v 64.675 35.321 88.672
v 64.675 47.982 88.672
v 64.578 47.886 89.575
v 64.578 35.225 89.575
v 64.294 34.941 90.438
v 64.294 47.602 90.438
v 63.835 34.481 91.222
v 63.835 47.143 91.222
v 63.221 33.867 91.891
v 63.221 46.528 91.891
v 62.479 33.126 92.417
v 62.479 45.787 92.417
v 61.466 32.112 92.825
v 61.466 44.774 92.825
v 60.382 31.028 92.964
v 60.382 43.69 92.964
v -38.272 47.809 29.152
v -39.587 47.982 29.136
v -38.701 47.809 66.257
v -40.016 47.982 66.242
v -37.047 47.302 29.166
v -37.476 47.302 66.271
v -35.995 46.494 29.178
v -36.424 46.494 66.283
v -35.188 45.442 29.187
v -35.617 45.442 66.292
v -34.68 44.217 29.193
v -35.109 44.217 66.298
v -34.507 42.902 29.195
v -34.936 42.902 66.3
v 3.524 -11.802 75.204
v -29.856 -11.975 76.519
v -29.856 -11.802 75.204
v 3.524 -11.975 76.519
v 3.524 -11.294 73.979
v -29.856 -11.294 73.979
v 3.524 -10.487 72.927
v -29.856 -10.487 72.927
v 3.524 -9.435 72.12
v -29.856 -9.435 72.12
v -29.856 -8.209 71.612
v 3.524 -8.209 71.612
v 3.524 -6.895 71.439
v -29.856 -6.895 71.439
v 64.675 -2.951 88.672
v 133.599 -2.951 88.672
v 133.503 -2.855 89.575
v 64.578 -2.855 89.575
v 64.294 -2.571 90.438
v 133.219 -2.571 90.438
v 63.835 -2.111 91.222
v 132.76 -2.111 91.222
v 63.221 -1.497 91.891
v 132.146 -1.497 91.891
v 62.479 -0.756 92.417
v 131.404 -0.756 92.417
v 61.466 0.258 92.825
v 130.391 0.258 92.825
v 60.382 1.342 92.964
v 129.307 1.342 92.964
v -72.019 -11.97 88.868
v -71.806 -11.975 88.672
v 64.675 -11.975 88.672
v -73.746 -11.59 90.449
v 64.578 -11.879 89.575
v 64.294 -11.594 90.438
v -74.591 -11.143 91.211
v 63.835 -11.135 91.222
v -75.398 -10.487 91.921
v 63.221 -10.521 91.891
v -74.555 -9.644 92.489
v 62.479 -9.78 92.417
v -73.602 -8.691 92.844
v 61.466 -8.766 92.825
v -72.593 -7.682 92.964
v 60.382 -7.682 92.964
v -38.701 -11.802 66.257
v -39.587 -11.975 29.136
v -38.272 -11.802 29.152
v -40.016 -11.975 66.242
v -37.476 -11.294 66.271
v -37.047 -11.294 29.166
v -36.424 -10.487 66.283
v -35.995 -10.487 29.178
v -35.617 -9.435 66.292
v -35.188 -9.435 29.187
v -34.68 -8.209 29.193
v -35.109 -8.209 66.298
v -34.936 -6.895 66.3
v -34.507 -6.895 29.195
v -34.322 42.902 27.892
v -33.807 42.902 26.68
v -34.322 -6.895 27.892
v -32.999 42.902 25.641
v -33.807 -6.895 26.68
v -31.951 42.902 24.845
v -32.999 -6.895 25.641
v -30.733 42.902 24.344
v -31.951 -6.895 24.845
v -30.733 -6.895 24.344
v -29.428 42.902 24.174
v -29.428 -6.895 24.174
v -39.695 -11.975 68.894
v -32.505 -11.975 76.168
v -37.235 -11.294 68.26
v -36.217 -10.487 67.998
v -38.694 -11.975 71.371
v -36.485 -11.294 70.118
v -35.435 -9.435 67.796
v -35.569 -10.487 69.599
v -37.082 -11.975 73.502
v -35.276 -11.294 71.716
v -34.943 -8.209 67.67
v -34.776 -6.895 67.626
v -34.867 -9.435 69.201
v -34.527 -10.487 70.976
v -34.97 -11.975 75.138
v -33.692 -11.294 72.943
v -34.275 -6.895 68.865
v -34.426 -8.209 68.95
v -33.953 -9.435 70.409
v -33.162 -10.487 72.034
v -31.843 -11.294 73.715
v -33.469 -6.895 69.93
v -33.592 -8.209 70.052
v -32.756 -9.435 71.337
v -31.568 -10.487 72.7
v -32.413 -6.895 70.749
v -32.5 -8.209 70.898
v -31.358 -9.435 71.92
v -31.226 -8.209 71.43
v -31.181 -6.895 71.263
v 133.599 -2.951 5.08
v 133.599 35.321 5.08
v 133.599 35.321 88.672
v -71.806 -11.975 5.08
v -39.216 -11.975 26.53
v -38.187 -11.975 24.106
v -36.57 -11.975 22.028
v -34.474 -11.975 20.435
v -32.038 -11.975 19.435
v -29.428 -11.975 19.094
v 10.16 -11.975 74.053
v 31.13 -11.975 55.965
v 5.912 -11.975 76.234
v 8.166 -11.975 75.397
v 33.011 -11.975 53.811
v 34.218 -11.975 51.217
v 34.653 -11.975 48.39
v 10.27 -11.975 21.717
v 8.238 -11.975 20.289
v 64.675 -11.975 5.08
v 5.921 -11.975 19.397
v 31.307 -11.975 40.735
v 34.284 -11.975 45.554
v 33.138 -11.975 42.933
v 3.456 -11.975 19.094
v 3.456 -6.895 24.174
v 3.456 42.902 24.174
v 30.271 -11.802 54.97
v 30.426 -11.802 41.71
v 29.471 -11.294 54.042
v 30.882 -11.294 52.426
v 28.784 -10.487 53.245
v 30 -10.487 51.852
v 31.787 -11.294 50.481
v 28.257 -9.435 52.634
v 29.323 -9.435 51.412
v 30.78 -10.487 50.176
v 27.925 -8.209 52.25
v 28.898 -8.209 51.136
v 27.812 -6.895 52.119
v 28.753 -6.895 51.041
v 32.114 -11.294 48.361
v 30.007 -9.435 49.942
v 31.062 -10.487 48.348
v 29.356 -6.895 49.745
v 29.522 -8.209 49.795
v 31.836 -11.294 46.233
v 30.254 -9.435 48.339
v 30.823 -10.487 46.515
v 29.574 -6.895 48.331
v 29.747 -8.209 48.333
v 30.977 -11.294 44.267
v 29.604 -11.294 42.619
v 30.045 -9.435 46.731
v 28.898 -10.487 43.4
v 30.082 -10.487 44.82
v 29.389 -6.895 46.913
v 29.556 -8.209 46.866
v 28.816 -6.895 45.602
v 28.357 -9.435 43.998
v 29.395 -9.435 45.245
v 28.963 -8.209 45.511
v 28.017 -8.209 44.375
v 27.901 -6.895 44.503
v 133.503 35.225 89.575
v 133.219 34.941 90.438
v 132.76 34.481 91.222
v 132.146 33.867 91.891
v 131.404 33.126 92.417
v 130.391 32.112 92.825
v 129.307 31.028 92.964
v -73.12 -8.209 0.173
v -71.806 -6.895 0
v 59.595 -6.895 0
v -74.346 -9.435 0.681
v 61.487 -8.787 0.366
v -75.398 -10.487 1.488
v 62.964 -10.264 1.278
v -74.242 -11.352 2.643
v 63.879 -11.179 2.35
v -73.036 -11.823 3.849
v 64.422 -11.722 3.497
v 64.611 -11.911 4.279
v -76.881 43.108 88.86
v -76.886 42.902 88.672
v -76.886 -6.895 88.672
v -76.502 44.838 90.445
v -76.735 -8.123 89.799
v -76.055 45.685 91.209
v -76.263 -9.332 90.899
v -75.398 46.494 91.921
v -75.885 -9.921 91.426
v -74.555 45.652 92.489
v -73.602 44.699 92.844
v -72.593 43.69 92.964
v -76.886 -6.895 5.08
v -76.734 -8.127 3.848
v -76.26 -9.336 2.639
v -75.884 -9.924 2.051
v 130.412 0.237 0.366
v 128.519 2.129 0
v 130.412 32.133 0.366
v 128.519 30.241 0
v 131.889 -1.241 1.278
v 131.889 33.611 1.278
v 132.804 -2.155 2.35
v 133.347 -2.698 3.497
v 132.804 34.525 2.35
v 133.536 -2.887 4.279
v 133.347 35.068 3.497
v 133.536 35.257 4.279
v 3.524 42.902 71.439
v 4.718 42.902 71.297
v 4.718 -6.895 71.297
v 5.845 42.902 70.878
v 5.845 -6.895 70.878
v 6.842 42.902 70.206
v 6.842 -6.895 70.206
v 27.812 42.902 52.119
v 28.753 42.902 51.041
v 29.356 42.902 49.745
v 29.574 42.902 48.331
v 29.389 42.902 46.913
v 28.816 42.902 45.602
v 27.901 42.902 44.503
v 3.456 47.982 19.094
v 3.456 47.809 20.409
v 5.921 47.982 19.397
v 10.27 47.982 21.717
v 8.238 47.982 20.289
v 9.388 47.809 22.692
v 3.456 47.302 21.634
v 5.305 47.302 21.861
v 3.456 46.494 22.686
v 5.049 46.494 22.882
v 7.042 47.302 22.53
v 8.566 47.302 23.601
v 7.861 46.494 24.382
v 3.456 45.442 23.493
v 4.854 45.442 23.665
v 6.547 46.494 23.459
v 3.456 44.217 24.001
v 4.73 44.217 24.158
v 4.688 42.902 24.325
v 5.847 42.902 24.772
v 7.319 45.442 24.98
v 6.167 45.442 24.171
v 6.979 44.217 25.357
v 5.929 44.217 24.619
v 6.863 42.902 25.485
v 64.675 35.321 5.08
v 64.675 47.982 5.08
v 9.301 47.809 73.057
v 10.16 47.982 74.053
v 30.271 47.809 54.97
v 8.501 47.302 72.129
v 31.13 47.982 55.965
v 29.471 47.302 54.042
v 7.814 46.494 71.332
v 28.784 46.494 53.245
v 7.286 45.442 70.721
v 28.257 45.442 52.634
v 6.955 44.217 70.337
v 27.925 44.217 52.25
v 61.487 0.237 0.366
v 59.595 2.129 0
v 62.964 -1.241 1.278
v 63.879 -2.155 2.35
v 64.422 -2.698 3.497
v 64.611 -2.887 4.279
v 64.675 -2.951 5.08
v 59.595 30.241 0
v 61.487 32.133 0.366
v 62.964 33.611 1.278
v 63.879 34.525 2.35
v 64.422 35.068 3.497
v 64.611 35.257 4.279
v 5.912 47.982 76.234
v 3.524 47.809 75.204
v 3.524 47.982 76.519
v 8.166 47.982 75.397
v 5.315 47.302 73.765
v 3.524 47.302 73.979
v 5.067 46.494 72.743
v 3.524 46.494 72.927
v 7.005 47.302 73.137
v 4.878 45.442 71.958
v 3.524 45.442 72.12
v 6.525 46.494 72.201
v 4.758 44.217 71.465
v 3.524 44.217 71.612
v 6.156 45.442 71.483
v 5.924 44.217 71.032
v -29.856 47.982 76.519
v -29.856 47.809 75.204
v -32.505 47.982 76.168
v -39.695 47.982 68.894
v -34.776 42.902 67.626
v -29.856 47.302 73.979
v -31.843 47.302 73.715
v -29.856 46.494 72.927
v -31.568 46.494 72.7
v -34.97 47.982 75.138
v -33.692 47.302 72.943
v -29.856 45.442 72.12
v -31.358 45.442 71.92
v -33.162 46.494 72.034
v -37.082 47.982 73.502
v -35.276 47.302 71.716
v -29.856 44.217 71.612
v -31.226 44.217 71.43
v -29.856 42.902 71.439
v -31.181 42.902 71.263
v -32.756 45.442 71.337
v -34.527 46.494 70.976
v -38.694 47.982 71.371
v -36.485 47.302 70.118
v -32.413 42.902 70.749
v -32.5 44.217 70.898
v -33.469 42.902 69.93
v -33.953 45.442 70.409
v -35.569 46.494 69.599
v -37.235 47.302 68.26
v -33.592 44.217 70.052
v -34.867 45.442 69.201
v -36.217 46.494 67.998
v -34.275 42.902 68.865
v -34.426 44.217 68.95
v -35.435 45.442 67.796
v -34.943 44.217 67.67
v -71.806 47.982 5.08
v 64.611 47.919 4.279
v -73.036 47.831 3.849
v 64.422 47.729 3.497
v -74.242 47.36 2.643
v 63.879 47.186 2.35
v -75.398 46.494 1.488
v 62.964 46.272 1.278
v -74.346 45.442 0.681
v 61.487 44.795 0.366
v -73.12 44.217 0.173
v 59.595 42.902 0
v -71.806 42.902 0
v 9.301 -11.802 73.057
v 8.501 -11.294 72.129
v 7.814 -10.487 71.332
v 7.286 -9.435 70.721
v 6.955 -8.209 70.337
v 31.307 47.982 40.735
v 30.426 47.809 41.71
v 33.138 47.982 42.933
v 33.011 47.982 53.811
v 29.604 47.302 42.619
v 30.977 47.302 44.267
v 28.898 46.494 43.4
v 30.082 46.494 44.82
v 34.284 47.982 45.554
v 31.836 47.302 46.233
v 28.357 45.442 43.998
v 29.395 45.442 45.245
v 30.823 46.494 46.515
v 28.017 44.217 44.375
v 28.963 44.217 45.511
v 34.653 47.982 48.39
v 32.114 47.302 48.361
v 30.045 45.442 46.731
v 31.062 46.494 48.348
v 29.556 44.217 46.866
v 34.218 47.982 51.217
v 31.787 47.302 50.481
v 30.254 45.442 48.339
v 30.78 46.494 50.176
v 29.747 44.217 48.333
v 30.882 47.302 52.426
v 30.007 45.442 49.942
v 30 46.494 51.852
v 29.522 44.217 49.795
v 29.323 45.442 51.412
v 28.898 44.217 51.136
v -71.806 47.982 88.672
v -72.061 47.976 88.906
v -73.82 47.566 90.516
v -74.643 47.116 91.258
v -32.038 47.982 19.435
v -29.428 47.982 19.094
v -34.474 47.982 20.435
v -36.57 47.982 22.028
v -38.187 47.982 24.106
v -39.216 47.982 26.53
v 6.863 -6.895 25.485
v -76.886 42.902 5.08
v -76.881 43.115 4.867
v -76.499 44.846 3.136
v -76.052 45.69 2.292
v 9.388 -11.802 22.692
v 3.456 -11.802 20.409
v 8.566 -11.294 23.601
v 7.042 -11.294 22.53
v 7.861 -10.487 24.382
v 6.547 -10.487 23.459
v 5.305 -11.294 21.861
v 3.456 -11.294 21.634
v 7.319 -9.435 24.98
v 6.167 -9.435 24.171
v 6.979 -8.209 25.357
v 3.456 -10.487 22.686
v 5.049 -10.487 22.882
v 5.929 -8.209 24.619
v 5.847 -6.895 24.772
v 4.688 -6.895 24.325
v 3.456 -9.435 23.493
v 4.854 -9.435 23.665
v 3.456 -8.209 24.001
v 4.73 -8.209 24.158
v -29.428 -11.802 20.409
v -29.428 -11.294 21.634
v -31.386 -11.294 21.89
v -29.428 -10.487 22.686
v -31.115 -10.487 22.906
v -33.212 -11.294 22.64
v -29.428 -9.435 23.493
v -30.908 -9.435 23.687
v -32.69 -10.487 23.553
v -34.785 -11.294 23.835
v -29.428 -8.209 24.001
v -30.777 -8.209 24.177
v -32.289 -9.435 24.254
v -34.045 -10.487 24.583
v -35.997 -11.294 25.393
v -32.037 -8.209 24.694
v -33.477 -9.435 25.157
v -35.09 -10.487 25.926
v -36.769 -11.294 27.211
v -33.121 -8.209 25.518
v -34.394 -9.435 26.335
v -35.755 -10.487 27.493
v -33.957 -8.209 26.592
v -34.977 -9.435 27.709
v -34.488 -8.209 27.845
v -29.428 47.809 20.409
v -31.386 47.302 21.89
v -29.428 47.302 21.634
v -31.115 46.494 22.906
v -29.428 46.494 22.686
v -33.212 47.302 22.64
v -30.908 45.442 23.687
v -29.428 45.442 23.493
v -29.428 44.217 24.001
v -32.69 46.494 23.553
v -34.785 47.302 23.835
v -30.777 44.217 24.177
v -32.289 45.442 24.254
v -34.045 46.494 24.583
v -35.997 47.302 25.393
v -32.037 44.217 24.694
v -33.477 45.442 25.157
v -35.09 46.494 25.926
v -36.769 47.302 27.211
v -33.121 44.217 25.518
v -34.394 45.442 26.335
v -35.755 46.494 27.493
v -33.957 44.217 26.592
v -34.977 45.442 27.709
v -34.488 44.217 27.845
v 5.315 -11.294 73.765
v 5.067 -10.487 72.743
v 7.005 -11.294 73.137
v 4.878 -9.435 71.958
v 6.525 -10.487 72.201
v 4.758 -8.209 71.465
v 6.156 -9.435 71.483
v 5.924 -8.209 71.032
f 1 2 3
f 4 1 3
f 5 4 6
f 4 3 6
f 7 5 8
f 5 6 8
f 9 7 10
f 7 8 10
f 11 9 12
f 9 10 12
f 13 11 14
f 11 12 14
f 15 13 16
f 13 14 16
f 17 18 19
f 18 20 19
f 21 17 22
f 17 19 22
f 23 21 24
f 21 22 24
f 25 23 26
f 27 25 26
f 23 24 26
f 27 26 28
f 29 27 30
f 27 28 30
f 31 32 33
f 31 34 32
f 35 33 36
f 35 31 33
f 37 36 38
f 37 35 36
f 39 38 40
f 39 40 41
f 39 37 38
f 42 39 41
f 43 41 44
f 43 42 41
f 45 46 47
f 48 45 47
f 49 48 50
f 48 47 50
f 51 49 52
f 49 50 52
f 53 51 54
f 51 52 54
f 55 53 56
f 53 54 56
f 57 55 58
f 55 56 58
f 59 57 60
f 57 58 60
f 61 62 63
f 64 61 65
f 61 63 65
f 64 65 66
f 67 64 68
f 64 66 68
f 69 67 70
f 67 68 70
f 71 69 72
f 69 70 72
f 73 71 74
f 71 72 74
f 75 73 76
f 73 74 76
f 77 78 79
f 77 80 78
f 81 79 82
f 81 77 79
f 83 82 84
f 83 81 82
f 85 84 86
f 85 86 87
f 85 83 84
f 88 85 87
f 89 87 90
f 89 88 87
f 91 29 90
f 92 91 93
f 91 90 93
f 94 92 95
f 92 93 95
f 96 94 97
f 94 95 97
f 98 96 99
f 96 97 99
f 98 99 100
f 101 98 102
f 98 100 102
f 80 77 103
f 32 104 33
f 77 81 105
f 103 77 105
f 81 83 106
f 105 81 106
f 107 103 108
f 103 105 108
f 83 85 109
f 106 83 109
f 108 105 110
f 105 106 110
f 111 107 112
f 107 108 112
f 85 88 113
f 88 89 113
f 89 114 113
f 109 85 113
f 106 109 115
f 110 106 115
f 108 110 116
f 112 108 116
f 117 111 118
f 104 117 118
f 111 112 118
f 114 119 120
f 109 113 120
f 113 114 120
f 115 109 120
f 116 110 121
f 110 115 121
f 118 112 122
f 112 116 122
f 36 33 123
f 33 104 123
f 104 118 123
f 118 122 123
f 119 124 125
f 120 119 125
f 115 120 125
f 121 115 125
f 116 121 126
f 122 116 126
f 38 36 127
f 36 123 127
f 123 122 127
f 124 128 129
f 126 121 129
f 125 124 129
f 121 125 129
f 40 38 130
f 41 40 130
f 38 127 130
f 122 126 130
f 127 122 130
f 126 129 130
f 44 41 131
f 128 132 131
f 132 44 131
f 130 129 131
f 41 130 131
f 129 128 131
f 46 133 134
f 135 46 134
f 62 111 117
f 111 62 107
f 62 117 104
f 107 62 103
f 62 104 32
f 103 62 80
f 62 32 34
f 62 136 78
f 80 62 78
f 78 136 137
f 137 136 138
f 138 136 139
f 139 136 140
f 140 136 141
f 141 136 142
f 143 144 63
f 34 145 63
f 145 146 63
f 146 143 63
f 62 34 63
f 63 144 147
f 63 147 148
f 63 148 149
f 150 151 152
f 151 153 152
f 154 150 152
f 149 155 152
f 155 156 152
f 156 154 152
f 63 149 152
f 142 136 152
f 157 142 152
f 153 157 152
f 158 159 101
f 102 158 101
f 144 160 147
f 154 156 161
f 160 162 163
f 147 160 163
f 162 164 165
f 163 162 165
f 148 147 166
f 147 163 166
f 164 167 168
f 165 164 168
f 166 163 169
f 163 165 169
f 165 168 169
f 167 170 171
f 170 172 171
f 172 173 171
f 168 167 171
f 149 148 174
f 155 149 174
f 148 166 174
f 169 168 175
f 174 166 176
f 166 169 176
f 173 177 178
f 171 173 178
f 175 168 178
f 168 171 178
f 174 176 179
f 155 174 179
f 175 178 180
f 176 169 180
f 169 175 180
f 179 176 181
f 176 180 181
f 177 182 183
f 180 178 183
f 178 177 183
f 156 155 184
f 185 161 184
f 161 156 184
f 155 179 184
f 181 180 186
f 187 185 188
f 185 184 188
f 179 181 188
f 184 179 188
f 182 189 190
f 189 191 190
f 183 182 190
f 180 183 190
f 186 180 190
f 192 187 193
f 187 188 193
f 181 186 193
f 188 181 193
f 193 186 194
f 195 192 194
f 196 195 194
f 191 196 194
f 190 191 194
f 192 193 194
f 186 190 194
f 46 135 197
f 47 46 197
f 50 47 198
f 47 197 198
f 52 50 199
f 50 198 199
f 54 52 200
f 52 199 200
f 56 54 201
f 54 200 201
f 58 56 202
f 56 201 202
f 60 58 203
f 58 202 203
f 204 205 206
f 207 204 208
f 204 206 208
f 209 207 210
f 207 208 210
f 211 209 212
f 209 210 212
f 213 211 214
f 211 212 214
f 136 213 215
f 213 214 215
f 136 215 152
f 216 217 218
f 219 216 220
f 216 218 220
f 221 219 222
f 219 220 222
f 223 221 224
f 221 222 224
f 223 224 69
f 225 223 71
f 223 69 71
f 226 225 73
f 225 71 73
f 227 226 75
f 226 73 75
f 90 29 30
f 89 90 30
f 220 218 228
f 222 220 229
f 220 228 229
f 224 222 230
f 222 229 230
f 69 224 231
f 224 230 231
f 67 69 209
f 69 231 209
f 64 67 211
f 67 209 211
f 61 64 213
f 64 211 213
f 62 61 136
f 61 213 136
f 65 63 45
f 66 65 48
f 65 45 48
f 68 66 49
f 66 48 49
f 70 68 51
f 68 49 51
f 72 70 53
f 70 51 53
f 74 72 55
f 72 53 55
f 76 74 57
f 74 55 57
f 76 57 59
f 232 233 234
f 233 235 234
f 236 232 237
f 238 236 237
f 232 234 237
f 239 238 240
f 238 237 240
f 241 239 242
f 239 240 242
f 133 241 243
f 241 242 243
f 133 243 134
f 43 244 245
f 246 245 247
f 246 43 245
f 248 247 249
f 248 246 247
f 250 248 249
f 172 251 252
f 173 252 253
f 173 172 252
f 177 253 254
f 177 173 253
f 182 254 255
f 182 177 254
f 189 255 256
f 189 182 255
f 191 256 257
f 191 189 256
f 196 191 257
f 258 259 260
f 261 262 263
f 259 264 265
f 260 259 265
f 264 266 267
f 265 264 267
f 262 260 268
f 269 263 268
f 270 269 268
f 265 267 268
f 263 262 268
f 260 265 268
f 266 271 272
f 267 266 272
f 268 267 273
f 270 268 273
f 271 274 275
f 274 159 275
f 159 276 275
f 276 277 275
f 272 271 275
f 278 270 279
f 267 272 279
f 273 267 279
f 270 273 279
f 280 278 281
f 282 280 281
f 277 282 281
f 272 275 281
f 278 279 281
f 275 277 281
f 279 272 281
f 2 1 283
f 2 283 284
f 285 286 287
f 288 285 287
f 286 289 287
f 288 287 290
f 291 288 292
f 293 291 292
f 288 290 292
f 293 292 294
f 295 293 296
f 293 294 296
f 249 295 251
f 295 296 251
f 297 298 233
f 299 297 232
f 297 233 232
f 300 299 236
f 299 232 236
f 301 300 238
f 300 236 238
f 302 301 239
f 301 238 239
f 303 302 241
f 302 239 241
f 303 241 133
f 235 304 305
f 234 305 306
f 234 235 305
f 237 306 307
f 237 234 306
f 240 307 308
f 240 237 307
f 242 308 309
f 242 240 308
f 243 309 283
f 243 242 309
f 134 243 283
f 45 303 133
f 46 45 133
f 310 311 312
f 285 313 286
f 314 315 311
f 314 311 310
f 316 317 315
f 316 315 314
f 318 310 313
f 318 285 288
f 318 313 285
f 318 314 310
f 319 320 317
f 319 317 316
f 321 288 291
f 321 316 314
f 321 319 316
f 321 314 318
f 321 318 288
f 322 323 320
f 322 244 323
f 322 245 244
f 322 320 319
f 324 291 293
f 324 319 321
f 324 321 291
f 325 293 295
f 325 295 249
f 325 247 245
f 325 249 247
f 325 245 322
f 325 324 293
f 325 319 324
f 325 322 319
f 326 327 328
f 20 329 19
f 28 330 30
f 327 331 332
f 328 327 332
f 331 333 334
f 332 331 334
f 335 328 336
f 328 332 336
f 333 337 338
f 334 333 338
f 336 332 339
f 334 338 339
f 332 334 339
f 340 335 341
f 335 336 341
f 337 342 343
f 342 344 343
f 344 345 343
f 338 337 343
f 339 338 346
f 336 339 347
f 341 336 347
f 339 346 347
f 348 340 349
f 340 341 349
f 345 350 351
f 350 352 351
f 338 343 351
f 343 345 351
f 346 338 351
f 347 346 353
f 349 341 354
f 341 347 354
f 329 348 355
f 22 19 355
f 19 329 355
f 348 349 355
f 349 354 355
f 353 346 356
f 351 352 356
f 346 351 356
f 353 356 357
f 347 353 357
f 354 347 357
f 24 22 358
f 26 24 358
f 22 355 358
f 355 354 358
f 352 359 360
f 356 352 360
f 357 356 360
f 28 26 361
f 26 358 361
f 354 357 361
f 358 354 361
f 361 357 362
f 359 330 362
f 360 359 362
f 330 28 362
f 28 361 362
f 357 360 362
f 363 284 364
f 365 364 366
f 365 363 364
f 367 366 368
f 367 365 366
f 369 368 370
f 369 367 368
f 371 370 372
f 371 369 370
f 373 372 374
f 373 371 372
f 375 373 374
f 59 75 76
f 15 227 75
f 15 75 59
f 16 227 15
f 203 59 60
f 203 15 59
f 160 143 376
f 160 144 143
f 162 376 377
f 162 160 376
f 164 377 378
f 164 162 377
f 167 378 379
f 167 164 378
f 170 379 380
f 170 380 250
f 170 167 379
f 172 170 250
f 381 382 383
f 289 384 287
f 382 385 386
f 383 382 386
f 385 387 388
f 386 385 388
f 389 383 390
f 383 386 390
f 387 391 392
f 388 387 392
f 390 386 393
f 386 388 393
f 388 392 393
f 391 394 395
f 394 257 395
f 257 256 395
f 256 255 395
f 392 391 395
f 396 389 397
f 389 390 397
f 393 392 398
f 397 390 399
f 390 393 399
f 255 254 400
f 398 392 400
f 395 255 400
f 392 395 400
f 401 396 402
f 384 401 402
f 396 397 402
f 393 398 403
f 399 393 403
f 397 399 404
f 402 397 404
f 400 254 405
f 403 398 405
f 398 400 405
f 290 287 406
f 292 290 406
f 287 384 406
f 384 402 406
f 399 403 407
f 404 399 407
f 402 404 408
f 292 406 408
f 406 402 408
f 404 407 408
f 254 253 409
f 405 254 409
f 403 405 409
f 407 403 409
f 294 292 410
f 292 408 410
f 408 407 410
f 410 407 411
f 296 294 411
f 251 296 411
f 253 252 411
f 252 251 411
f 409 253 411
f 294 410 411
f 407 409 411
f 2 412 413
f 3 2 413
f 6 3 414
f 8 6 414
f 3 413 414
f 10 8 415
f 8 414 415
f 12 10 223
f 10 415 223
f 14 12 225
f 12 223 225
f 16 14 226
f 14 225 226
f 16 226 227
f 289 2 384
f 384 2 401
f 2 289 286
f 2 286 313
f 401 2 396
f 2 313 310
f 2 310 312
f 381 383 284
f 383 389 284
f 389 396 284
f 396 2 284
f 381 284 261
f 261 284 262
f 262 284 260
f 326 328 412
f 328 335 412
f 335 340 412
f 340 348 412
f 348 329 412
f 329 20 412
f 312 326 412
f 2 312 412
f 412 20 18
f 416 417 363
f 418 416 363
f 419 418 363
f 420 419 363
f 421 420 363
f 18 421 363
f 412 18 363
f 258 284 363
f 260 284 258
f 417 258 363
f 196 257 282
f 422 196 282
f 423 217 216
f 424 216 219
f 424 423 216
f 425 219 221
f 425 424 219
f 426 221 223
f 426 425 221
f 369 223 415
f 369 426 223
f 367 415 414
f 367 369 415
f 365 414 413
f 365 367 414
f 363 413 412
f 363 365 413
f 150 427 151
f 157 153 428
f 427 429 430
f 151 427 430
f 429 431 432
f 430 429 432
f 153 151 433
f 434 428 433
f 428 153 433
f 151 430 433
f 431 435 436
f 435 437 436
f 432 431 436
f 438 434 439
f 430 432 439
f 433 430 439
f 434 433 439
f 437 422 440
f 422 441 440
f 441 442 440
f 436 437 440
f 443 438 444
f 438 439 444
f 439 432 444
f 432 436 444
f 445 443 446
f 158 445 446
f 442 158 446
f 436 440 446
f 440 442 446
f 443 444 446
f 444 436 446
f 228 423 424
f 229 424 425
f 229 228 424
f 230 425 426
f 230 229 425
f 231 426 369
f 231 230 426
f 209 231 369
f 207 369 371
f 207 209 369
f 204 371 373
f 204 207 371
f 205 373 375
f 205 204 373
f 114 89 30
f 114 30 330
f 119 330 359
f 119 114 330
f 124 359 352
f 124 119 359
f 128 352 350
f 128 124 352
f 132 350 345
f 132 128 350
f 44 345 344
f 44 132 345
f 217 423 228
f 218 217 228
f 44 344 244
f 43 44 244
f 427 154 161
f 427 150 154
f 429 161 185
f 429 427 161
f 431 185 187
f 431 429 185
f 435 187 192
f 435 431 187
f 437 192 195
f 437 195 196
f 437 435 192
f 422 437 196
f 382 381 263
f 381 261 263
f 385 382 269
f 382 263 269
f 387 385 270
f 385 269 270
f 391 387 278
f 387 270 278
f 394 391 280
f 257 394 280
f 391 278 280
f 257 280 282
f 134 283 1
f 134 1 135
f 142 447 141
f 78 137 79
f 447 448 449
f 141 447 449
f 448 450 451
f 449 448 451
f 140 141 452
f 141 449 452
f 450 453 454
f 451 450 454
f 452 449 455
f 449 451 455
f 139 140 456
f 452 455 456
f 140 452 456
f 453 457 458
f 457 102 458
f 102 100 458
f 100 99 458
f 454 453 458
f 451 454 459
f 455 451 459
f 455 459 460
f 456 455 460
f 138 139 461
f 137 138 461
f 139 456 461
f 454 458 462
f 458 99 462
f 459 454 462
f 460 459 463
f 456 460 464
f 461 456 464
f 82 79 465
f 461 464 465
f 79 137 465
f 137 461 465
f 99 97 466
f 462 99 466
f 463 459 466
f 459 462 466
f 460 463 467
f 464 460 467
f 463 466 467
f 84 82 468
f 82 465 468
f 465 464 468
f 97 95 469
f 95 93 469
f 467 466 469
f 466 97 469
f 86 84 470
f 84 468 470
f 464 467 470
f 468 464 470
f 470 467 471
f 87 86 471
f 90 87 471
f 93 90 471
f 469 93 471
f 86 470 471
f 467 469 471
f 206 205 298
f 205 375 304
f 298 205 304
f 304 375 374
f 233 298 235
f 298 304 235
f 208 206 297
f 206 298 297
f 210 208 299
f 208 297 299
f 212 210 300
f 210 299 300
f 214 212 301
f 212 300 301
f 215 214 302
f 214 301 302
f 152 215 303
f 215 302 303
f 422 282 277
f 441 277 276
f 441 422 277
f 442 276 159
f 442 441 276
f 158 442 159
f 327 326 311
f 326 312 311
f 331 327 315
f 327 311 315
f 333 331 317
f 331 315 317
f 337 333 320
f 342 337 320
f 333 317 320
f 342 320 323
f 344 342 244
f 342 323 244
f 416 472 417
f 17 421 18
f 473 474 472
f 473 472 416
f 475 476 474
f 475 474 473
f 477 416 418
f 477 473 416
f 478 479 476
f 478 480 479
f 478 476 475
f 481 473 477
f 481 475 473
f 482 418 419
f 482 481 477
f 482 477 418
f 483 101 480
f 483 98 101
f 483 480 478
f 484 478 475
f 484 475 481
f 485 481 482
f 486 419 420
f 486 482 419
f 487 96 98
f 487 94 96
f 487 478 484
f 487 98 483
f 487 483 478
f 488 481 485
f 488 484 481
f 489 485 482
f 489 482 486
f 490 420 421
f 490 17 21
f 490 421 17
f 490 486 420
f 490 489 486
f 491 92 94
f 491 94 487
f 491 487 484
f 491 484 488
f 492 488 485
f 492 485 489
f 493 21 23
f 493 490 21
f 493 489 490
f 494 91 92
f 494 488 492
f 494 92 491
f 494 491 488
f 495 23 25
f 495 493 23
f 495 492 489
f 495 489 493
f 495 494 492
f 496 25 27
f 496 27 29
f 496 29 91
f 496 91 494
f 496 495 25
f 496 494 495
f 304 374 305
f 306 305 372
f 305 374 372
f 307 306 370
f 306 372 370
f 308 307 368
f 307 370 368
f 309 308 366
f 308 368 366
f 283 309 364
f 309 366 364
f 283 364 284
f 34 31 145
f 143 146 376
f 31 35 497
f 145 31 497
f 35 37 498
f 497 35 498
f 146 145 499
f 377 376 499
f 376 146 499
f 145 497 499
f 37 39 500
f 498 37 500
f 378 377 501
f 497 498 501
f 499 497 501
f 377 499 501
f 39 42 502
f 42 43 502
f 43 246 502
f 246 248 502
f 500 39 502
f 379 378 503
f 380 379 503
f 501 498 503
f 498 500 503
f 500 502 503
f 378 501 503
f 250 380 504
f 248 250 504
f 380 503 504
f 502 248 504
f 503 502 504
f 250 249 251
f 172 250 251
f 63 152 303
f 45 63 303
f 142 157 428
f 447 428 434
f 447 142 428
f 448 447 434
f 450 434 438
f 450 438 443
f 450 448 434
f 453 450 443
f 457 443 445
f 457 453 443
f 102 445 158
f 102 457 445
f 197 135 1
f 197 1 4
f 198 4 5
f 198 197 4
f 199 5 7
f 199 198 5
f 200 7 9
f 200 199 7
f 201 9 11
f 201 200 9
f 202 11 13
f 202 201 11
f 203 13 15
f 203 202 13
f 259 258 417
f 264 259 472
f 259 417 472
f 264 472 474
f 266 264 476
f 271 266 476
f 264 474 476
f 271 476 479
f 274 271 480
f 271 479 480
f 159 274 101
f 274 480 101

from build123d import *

# Parameters (mm, degrees)
F0_W        = 68.9248368144
F0_H        = 38.2718367036
F1_DEPTH    = 92.964
F2_R        = 4.2924717139
F3_R        = 5.08
F4_T1_DEPTH = 108.9915282861
F6_DEPTH    = 66.294
F7_R        = 5.08


# Not quite as in the source:
# - a fillet or chamfer that OpenCascade refuses, or shapes differently, is made with other operations: its cross-section is extruded or revolved along the edge and cut away or added


with BuildPart() as f1:
    # F0 (on Top) → F1 (new body)
    with BuildSketch(Plane.XY):
        Polygon((-76.8856033683, 47.9822456837), (-76.8856033683, -11.9746578857), (64.6745637059, -11.9746578857), (64.6745637059, -2.9509027954), (64.6745637059, 35.3209339082), (64.6745637059, 47.9822456837), align=None)
        with Locations((99.1369821131, 16.1850155564)):
            Rectangle(F0_W, F0_H)
    extrude(amount=F1_DEPTH)

    # F2
    f2_edges = [f1.edges().sort_by_distance(p)[0] for p in [
        (-76.885603, 18.003794, 92.964),
        (-6.10552, -11.974658, 92.964),
        (64.674564, -7.46278, 92.964),
        (99.136982, -2.950903, 92.964),
        (133.599401, 16.185016, 92.964),
        (99.136982, 35.320934, 92.964),
        (64.674564, 41.65159, 92.964),
        (-6.10552, 47.982246, 92.964),
    ]]
    fillet(f2_edges, radius=F2_R)

    # F3
    f3_edges = [f1.edges().sort_by_distance(p)[0] for p in [
        (99.136982, -2.950903, 0),
        (-76.885603, 18.003794, 0),
        (-6.10552, -11.974658, 0),
        (64.674564, -7.46278, 0),
        (133.599401, 16.185016, 0),
        (99.136982, 35.320934, 0),
        (64.674564, 41.65159, 0),
        (-6.10552, 47.982246, 0),
    ]]
    fillet(f3_edges, radius=F3_R)

    # F4: fillet of radius 5.08 on 4 edges, made by hand

    # F4_s2 → F4_t1 (cut)
    with BuildSketch(Plane.XY.offset(-7.62)):
        with BuildLine():
            ThreePointArc((-76.8856033683, 42.9022456837), (-75.3977058167, 46.4943481321), (-71.8056033683, 47.9822456837))
            Line((-71.8056033683, 47.9822456837), (-76.8856033683, 47.9822456837))
            Line((-76.8856033683, 47.9822456837), (-76.8856033683, 42.9022456837))
        make_face()
        with BuildLine():
            ThreePointArc((-76.8856033683, -6.8946578857), (-75.3977058167, -10.4867603342), (-71.8056033683, -11.9746578857))
            Line((-71.8056033683, -11.9746578857), (-76.8856033683, -11.9746578857))
            Line((-76.8856033683, -11.9746578857), (-76.8856033683, -6.8946578857))
        make_face()
    extrude(amount=F4_T1_DEPTH, mode=Mode.SUBTRACT)

    # F5 (on face) → F6 (cut)
    with BuildSketch(Plane(origin=(0, 47.9822456837, 0), x_dir=(-1, 0, 0), z_dir=(0, 1, 0))):
        Polygon((34.4493128359, 24.1737514734), (34.9953584373, 71.4389234781), (-5.412035156, 71.4389234781), (-32.1682840586, 48.3612157404), (-5.412035156, 24.1737514734), align=None)
    extrude(amount=-F6_DEPTH, mode=Mode.SUBTRACT)

    # F7
    f7_edges = [f1.edges().sort_by_distance(p)[0] for p in [
        (-34.722336, 47.982246, 47.806337),
        (-34.995358, 18.003794, 71.438923),
        (-34.722336, -11.974658, 47.806337),
        (-34.449313, 18.003794, 24.173751),
        (18.79016, 47.982246, 59.90007),
        (32.168284, 18.003794, 48.361216),
        (18.79016, -11.974658, 59.90007),
        (5.412035, 18.003794, 71.438923),
        (18.79016, 47.982246, 36.267484),
        (5.412035, 18.003794, 24.173751),
        (18.79016, -11.974658, 36.267484),
        (-14.791662, -11.974658, 71.438923),
        (-14.518639, -11.974658, 24.173751),
        (-14.518639, 47.982246, 24.173751),
        (-14.791662, 47.982246, 71.438923),
    ]]
    fillet(f7_edges, radius=F7_R)


solid = f1.part
